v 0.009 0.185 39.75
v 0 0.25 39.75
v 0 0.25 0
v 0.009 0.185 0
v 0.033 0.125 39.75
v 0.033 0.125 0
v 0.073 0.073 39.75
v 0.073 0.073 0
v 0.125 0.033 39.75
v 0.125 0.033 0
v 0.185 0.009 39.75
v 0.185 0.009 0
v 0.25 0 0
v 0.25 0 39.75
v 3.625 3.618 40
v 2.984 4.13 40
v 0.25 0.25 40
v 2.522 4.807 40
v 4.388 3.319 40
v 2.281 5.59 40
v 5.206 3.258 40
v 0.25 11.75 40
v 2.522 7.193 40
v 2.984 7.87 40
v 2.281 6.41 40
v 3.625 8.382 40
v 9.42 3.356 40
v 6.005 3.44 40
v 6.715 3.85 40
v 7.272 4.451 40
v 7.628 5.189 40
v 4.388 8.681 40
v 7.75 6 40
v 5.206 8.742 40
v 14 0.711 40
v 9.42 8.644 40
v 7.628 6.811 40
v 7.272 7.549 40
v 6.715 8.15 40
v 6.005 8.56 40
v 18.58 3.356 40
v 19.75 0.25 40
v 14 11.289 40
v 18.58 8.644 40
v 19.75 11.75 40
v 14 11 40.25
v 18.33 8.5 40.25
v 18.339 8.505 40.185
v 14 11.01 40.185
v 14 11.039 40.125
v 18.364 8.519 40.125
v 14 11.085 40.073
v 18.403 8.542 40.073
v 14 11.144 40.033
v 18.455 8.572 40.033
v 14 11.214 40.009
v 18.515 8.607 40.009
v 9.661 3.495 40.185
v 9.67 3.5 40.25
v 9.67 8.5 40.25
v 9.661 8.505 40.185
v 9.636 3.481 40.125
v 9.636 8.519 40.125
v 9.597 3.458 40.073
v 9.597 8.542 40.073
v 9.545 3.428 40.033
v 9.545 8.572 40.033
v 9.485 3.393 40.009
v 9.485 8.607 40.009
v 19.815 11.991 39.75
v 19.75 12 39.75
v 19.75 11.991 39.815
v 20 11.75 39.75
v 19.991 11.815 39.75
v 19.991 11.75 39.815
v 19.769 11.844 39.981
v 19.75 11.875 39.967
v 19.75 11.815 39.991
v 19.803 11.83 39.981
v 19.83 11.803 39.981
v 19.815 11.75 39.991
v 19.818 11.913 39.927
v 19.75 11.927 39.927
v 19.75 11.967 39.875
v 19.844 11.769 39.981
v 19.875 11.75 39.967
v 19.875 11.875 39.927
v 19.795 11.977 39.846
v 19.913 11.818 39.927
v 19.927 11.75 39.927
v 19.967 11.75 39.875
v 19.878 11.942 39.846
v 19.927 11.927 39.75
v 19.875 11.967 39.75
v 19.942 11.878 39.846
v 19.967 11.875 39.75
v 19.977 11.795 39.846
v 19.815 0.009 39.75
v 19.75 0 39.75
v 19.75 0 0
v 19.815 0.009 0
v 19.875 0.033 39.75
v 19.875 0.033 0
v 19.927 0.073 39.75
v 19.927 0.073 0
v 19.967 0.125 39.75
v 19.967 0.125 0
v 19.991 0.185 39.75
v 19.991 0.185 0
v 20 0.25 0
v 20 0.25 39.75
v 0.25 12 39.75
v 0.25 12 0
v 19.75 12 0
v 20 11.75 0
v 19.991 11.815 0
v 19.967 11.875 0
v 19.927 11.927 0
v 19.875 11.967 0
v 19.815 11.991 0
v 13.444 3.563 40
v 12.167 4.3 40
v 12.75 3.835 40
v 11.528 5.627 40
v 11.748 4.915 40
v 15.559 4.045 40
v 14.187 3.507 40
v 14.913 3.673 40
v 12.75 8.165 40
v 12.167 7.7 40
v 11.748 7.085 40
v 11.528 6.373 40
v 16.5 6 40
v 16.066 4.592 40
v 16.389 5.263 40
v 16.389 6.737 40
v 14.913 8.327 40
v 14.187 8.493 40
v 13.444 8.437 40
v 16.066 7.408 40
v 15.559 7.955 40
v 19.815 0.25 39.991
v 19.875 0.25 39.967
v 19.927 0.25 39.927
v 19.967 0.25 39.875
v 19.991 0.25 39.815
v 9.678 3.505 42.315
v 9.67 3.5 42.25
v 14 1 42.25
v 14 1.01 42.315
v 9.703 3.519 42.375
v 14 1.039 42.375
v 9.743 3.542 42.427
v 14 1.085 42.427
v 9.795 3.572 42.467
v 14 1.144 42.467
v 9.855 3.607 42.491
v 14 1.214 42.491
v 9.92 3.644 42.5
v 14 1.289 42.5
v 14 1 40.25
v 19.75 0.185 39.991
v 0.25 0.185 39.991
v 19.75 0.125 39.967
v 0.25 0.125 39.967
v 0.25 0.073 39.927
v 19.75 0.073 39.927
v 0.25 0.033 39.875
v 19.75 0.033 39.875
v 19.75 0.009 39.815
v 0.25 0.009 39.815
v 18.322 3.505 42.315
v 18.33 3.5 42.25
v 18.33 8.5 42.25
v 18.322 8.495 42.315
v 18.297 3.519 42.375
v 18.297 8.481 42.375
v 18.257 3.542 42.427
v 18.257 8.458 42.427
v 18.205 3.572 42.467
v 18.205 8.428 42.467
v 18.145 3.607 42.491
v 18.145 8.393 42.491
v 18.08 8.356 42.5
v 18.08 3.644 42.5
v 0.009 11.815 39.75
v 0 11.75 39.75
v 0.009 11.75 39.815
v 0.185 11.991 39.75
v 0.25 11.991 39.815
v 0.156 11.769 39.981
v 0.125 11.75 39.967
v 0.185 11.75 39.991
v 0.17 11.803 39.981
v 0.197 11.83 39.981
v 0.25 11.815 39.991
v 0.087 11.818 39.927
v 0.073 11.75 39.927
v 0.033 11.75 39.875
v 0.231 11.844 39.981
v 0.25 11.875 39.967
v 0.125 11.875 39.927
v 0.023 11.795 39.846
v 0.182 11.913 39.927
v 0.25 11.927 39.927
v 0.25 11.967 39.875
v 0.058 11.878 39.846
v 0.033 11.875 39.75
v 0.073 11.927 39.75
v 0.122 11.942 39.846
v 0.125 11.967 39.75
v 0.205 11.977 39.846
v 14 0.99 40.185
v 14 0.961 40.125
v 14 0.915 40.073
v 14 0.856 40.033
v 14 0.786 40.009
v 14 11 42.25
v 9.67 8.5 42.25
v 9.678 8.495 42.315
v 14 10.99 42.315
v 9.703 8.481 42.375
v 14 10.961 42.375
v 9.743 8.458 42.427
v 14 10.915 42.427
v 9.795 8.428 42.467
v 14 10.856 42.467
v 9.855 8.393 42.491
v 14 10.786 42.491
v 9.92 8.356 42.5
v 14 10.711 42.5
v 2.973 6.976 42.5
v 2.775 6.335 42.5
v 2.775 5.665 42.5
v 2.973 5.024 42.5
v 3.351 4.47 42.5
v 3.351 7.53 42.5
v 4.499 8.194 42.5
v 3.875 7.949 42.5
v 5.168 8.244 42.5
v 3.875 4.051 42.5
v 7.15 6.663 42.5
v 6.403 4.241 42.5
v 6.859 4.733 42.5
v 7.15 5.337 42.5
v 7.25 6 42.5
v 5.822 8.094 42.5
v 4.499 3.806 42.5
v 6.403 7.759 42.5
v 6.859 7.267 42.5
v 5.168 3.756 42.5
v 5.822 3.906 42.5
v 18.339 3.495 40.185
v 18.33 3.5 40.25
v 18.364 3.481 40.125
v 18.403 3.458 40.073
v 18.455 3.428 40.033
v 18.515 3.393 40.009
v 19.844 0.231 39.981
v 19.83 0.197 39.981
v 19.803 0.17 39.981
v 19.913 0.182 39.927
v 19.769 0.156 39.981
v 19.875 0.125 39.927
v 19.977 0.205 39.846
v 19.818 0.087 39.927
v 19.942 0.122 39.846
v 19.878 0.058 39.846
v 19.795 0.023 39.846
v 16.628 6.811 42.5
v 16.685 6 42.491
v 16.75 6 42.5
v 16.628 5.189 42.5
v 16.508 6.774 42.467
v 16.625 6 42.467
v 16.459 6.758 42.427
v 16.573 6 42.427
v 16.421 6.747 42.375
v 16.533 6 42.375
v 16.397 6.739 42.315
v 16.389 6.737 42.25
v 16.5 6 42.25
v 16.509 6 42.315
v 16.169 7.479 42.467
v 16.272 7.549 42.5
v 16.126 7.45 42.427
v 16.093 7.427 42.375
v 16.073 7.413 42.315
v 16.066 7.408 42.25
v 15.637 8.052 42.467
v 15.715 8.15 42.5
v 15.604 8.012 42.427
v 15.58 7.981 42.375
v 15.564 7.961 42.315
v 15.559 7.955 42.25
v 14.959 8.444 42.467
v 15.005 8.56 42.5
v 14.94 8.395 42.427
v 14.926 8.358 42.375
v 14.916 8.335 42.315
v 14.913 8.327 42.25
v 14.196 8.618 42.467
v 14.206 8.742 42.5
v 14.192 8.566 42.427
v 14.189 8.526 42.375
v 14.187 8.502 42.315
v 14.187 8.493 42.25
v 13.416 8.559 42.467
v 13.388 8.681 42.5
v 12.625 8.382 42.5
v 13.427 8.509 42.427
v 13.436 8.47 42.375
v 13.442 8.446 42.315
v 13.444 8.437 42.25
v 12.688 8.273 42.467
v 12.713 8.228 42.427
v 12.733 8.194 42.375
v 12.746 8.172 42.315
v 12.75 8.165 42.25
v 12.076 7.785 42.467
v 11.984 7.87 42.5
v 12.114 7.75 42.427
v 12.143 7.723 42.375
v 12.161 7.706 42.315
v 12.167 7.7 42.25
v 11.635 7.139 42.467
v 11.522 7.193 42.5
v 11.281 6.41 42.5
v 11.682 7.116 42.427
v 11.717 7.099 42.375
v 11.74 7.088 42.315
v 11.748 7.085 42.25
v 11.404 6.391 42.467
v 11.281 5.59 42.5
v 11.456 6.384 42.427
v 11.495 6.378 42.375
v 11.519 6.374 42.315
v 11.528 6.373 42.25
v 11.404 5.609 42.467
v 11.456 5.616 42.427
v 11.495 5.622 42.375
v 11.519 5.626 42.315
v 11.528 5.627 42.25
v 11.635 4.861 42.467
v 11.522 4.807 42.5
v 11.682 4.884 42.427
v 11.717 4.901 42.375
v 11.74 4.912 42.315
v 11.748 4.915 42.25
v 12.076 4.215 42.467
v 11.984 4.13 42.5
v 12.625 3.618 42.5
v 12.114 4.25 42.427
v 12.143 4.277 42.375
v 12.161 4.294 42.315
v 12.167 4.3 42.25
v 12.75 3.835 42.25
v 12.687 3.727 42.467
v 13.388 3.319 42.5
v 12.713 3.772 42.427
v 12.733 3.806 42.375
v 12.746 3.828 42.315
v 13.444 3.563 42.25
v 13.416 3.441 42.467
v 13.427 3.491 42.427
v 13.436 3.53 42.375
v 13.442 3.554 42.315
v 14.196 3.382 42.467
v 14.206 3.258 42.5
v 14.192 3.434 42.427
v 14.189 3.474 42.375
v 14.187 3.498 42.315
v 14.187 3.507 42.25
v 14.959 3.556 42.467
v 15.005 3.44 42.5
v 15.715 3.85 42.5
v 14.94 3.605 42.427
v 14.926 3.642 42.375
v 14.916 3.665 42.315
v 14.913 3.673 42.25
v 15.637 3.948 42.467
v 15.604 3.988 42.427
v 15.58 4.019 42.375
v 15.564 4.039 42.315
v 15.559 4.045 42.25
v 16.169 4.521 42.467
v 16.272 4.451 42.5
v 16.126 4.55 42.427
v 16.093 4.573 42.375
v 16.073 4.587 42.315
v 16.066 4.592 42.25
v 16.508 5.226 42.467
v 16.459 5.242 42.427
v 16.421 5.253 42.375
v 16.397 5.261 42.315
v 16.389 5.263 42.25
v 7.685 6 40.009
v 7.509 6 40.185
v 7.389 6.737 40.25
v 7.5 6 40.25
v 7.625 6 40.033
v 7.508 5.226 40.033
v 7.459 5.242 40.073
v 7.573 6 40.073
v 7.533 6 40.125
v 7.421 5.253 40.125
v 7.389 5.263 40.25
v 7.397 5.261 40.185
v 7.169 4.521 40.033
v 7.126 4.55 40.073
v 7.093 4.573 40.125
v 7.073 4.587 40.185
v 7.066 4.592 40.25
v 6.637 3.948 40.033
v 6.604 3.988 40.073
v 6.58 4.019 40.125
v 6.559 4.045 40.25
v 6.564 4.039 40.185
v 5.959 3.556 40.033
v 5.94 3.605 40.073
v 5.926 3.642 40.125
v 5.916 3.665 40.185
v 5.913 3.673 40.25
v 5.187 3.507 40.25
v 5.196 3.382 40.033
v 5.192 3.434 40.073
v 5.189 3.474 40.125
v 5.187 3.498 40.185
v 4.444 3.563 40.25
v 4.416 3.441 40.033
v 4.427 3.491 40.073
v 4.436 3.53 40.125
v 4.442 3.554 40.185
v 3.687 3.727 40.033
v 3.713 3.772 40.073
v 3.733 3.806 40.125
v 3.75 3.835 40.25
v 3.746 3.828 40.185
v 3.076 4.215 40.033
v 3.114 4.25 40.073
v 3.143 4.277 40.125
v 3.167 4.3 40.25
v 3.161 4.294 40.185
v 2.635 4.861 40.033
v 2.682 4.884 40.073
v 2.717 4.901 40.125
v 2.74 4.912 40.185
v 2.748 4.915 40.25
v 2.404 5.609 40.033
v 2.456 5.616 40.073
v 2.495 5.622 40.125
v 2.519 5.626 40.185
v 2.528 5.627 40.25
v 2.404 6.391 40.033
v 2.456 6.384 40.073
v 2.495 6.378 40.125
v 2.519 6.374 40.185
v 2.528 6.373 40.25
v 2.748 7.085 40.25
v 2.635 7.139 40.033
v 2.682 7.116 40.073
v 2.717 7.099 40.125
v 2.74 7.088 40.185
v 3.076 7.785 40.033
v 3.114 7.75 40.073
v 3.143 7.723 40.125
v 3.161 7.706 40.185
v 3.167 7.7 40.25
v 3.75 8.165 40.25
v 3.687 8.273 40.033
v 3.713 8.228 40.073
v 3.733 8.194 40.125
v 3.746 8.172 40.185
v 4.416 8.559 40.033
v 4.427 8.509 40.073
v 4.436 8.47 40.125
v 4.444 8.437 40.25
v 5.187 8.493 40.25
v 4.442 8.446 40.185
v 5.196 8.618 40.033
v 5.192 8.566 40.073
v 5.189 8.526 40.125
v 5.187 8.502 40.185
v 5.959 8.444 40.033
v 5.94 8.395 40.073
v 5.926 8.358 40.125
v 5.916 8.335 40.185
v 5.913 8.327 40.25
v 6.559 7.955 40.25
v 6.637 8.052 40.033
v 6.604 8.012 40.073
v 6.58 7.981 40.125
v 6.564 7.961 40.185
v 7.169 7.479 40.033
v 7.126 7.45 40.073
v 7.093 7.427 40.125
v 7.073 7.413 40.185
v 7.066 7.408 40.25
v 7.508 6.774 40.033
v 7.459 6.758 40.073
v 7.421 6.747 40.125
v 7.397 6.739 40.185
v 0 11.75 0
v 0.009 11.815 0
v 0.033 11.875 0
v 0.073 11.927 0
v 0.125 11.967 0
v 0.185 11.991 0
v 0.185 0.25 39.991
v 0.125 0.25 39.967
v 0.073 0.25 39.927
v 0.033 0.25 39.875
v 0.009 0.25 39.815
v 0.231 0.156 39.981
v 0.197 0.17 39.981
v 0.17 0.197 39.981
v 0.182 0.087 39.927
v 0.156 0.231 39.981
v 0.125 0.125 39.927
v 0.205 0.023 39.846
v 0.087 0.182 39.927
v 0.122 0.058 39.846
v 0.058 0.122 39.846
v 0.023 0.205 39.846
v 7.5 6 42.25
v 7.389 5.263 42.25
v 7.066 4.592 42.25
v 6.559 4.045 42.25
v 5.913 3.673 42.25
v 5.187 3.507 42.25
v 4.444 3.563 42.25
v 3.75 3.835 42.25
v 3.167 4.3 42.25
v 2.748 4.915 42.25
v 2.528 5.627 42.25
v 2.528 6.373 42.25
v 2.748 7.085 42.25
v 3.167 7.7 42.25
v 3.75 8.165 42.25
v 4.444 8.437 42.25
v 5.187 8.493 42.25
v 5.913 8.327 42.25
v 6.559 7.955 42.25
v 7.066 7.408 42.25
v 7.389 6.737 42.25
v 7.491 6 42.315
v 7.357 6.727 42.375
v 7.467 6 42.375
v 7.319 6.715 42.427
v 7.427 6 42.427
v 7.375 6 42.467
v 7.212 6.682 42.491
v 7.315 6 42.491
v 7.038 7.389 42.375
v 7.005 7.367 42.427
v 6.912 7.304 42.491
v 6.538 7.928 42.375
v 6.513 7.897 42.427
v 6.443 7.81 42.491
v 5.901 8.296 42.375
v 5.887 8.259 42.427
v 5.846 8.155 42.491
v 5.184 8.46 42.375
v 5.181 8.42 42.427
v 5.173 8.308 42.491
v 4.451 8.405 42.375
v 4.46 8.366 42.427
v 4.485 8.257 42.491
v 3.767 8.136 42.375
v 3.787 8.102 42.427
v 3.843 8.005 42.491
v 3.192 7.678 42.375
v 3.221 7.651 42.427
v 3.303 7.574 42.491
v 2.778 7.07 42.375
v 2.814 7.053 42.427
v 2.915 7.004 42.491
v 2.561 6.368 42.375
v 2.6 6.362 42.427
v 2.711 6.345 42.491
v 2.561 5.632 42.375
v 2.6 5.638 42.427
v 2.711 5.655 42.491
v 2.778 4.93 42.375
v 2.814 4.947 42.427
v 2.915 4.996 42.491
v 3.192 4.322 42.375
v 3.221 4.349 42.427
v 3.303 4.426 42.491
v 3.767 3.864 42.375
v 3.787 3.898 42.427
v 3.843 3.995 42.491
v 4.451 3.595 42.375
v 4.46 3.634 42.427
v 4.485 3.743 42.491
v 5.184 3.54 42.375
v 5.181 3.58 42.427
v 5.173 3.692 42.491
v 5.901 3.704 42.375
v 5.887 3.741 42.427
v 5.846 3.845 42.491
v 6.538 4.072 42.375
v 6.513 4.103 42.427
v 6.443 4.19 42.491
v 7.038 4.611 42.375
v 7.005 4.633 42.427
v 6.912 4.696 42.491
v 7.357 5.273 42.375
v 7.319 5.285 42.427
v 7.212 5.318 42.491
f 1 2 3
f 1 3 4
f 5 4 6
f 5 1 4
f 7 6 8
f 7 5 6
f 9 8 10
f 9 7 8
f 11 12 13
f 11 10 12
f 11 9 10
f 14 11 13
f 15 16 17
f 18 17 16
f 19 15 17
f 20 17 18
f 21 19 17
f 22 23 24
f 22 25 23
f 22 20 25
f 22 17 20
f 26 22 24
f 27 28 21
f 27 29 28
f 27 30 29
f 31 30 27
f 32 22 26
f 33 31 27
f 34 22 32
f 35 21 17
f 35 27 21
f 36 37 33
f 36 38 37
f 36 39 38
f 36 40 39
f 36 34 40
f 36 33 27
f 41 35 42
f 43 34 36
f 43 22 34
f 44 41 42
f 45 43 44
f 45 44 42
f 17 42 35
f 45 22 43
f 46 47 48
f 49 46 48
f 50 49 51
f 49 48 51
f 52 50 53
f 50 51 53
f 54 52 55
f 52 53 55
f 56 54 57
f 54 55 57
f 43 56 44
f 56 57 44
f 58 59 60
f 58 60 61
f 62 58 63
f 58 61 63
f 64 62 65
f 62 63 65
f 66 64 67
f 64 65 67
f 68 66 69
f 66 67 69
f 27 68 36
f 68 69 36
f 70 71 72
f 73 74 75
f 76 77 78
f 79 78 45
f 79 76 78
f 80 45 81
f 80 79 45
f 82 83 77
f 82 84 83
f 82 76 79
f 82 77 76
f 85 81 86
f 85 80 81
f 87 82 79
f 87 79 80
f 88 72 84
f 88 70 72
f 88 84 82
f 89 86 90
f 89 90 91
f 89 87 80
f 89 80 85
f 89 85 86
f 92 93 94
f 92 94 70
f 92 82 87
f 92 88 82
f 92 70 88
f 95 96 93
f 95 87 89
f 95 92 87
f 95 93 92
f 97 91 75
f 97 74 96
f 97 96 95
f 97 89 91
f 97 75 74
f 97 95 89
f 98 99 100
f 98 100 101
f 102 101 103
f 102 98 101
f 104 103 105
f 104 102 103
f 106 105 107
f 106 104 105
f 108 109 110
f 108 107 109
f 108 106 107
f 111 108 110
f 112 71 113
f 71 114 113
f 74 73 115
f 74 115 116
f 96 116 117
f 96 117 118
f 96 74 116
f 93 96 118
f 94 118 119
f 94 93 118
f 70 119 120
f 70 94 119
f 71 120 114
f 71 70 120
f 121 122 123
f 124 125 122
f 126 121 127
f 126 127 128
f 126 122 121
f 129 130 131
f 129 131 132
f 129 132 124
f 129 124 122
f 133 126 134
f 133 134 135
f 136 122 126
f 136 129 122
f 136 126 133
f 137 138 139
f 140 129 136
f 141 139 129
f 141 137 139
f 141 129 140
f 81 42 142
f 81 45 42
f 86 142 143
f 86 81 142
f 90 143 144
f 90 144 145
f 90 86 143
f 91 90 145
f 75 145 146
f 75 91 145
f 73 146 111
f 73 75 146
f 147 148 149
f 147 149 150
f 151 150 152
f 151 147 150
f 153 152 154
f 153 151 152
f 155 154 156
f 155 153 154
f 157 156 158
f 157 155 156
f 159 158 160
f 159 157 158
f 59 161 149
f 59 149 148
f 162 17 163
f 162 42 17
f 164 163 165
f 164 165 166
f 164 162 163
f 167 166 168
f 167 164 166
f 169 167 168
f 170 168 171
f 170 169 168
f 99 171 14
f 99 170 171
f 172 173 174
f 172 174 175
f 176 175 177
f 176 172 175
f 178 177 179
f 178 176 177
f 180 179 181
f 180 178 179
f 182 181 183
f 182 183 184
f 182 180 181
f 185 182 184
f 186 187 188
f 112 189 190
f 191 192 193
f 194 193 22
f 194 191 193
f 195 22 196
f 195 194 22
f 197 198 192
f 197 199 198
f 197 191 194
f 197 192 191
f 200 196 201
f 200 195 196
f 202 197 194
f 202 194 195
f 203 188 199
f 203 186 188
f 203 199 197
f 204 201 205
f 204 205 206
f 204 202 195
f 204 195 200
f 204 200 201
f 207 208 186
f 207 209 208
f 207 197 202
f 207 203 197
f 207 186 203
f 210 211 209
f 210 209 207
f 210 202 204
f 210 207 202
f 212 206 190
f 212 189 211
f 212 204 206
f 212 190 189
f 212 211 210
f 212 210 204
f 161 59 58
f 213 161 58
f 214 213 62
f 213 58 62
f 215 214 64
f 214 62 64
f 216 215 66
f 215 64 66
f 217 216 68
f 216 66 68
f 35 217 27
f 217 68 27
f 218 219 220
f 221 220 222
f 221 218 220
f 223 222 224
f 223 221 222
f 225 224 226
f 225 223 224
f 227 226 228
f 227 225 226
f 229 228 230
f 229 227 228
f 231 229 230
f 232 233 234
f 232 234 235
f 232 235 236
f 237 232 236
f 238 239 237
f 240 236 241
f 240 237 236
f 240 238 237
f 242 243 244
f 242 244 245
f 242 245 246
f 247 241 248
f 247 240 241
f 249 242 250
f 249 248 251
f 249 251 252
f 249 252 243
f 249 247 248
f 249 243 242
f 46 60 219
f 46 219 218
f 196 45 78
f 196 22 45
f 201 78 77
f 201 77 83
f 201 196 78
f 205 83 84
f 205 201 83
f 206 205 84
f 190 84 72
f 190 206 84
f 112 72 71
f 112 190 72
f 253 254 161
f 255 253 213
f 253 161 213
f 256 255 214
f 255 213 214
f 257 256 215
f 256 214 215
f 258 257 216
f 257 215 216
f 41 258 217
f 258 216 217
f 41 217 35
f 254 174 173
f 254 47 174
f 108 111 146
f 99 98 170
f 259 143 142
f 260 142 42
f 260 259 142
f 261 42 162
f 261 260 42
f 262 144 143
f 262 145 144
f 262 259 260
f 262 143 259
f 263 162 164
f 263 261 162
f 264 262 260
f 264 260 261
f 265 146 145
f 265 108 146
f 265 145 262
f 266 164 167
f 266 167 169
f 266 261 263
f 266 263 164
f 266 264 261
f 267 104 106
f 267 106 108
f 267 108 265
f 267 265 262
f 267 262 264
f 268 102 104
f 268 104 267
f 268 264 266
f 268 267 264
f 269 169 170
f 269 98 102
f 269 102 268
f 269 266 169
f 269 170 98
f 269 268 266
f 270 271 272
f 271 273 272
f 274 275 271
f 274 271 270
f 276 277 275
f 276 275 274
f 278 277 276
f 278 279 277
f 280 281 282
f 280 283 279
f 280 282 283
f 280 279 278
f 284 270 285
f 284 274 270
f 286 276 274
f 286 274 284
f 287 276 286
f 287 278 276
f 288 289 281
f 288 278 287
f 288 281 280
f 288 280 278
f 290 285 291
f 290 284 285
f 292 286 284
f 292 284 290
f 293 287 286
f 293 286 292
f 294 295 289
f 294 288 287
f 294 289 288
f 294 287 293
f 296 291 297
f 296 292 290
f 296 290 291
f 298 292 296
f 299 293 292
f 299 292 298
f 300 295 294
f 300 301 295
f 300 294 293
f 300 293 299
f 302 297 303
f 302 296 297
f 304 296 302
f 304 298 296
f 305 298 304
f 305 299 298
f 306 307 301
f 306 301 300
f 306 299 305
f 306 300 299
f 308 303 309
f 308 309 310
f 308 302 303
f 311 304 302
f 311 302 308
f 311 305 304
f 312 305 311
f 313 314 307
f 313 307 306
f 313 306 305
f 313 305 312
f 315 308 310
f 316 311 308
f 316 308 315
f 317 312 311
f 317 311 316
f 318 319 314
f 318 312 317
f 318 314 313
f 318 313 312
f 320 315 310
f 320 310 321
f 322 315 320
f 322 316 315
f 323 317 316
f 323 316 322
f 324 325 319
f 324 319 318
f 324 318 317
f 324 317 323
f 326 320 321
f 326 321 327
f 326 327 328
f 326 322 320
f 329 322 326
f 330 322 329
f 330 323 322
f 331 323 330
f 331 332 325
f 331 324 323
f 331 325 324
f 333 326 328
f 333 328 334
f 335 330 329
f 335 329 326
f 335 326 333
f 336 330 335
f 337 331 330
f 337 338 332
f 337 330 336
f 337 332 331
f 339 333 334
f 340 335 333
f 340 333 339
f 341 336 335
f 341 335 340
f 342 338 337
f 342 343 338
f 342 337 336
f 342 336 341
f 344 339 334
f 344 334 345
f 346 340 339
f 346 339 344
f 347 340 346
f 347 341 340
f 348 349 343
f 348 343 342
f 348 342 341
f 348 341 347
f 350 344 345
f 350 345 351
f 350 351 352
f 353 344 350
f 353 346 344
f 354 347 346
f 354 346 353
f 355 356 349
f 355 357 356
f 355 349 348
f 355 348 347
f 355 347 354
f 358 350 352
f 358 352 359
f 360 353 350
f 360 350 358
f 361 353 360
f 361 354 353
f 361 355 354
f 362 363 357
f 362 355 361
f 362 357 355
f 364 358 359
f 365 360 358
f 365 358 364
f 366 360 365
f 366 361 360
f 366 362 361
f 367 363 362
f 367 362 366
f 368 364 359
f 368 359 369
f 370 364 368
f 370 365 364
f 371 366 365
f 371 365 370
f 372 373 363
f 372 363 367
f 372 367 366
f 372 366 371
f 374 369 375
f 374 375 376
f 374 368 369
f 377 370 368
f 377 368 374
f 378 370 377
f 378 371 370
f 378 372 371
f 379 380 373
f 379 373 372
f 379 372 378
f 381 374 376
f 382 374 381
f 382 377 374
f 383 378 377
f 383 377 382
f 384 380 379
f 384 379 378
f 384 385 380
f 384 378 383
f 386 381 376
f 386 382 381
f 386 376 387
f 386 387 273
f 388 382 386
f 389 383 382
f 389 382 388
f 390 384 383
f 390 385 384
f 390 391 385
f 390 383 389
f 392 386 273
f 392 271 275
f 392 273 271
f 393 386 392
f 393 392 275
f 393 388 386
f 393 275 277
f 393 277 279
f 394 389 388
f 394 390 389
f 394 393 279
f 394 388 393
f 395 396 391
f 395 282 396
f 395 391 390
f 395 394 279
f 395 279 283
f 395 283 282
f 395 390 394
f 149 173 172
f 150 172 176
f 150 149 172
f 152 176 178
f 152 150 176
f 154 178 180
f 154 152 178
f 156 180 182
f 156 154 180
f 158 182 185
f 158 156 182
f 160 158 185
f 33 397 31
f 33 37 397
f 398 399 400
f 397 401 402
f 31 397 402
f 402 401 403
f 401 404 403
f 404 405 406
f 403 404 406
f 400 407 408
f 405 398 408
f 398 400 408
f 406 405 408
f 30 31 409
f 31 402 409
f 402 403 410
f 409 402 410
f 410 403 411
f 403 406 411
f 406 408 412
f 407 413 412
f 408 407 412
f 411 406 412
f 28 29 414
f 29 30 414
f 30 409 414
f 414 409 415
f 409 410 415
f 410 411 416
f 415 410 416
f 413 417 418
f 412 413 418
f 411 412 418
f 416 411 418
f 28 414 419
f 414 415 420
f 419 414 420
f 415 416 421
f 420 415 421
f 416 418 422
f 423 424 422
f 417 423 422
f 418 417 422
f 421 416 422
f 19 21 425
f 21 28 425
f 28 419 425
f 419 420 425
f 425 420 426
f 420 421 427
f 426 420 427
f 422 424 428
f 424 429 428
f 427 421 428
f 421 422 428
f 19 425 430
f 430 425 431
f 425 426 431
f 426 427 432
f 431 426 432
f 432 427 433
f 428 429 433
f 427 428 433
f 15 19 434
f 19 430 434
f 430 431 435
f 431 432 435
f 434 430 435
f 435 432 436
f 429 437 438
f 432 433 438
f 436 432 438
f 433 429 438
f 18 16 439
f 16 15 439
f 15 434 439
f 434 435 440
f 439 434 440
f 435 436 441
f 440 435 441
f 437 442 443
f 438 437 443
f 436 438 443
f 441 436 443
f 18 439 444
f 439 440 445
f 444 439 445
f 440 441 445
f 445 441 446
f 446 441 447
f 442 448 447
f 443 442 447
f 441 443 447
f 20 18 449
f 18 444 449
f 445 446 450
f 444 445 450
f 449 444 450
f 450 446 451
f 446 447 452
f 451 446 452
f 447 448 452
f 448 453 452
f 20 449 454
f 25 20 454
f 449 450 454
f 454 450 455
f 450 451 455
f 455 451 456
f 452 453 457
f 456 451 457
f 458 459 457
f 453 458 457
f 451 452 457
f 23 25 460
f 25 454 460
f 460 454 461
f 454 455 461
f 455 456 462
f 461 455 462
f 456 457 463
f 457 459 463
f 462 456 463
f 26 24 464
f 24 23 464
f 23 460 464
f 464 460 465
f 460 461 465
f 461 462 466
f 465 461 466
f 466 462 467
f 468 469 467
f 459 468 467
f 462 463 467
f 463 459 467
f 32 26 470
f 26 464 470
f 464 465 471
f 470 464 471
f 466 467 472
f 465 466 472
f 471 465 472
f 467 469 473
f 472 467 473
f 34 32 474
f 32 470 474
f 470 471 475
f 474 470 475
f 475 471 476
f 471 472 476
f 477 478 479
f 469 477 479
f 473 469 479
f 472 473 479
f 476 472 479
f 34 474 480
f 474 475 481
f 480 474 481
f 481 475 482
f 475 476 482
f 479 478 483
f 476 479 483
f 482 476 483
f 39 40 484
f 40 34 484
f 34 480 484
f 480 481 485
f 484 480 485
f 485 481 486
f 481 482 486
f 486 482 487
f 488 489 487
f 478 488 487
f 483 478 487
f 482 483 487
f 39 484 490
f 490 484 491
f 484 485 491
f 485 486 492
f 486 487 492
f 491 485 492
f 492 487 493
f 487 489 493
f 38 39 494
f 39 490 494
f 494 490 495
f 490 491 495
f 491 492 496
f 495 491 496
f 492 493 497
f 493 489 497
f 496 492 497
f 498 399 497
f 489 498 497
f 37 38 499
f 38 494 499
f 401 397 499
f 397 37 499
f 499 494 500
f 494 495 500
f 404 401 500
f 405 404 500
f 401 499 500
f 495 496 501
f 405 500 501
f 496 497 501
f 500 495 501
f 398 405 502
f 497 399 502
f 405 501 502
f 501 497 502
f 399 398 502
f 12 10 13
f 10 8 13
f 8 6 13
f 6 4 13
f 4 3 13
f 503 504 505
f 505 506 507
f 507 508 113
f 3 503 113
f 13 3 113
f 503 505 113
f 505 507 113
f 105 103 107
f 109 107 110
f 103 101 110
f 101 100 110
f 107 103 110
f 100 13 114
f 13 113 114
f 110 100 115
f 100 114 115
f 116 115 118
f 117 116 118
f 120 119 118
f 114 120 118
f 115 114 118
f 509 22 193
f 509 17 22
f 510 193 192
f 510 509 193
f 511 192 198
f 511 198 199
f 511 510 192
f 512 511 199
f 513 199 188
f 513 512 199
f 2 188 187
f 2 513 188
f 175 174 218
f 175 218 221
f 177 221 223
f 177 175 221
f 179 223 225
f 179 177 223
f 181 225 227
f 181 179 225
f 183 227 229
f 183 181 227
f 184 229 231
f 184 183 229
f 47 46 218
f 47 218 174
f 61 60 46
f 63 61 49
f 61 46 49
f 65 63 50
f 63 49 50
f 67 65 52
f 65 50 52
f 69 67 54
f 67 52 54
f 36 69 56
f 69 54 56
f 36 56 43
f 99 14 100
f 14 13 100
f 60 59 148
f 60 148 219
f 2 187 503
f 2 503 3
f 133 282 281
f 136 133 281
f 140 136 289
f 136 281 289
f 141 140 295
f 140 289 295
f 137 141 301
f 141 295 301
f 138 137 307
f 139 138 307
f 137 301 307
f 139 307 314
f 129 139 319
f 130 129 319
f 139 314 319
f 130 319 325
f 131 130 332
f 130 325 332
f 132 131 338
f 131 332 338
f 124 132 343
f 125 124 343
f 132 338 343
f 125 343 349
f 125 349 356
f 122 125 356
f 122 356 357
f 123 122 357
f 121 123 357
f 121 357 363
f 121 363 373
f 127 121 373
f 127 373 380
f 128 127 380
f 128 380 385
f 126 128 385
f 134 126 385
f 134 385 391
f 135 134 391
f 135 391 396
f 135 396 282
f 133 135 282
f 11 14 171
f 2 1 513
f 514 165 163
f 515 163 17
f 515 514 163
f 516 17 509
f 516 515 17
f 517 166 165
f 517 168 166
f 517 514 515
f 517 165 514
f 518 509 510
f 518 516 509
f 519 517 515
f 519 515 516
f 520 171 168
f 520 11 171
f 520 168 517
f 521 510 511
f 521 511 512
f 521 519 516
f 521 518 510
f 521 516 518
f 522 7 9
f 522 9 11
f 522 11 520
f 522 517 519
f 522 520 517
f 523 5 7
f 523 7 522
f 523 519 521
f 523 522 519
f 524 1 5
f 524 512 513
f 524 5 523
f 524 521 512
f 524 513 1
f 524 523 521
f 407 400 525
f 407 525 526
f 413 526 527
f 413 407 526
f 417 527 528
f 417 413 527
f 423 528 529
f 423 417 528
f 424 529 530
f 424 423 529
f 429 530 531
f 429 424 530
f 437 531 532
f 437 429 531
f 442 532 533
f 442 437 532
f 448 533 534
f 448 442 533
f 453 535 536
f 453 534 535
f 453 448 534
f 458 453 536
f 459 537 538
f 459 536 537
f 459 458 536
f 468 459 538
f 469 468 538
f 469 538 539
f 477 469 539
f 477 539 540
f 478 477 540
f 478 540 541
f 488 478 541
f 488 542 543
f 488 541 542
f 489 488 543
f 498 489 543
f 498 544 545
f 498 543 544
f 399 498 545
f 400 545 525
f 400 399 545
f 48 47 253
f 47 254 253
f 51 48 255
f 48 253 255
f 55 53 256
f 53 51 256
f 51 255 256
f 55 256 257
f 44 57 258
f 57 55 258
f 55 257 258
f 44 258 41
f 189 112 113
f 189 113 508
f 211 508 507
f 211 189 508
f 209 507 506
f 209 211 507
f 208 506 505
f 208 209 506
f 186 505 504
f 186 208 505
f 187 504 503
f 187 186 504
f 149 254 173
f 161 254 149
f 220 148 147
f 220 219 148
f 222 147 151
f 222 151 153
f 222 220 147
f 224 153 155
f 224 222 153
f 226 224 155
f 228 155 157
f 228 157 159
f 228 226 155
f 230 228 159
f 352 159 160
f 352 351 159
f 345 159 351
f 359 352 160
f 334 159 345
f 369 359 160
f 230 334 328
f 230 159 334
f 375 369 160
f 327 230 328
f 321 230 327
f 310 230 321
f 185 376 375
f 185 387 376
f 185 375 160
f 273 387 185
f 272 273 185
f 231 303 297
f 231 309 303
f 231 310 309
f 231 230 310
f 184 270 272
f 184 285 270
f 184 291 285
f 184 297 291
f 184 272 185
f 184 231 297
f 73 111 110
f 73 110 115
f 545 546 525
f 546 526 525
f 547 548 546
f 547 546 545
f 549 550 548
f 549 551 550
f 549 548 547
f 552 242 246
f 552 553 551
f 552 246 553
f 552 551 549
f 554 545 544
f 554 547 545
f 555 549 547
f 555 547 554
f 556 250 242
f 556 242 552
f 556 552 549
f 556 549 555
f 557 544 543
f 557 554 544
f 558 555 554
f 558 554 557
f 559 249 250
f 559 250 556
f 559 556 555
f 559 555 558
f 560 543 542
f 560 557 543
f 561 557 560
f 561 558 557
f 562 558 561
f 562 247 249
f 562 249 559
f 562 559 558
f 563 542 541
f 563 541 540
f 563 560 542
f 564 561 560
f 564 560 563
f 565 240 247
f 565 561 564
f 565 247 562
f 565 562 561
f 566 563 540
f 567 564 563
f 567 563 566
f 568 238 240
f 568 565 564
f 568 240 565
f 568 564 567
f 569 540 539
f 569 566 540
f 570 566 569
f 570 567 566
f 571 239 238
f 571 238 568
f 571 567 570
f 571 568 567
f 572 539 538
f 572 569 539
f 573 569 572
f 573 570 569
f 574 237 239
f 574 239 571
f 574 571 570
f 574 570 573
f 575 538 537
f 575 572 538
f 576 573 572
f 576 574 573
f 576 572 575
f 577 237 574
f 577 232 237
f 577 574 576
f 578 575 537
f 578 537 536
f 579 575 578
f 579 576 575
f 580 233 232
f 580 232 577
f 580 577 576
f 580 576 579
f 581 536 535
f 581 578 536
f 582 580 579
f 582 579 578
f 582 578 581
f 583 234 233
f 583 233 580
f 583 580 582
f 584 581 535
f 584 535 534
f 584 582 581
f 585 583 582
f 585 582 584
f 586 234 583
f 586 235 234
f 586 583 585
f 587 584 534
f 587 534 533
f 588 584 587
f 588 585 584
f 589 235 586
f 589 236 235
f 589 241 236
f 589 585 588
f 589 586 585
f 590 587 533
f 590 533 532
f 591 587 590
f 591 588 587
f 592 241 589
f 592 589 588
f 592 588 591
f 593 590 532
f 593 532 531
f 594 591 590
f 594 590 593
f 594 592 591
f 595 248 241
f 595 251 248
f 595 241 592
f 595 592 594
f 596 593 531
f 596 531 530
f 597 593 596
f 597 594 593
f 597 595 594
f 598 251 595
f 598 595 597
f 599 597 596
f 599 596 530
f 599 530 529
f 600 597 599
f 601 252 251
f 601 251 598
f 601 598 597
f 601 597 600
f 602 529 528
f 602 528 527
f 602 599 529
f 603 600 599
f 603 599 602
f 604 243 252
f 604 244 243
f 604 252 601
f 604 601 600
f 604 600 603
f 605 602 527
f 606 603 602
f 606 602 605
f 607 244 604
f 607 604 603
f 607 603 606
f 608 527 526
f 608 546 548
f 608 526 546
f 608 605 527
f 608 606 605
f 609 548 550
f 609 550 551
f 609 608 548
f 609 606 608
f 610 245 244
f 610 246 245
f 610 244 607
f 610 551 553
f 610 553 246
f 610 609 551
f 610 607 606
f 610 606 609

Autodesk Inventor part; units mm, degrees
ref_plane "YZ Plane" through (0, 0, 0) normal (1, 0, 0) x (0, 1, 0)
ref_plane "XZ Plane" through (0, 0, 0) normal (0, 1, 0) x (-1, 0, 0)
ref_plane "XY Plane" through (0, 0, 0) normal (0, 0, 1) x (1, 0, 0)
sketch "Sketch1" plane through (0, 0, 0) normal (0, 0, 1) x (1, 0, 0)
  line L0 (20, 12) -> (0, 12)
  line L1 (0, 12) -> (0, 0)
  line L2 (0, 0) -> (20, 0)
  line L3 (20, 0) -> (20, 12)
extrude "Extrusion1" add sketch "Sketch1" along normal blind 40
sketch "Sketch2" plane through (0, 0, 40) normal (0, 0, 1) x (1, 0, 0)
  circle A0 centre (5, 6) radius 2.5
  line L0 (14, 1) -> (9.6699, 3.5)
  line L1 (9.6699, 3.5) -> (9.6699, 8.5)
  line L2 (9.6699, 8.5) -> (14, 11)
  line L3 (14, 11) -> (18.3301, 8.5)
  line L4 (18.3301, 8.5) -> (18.3301, 3.5)
  line L5 (18.3301, 3.5) -> (14, 1)
  point P0 (0, 0)
  point P1 (14, 6)
extrude "Extrusion2" add sketch "Sketch2" along normal blind 2.5
sketch "Sketch3" plane through (0, 0, 42.5) normal (0, 0, 1) x (1, 0, 0)
  circle A0 centre (14, 6) radius 2.5
  point P0 (0, 0)
  dimension "d15" = 5
extrude "Extrusion3" cut sketch "Sketch3" against normal blind 2.5
fillet "Fillet1" radius 0.25 1 edges at (2.5, 6, 42.5)
fillet "Fillet2" radius 0.25 13 edges at (11.8349, 2.25, 42.5) (16.1651, 2.25, 42.5) (18.3301, 6, 42.5) (9.6699, 6, 42.5) (11.8349, 9.75, 42.5) (16.1651, 9.75, 42.5) (11.5, 6, 42.5) (16.1651, 2.25, 40) (11.8349, 2.25, 40) (18.3301, 6, 40) (16.1651, 9.75, 40) (9.6699, 6, 40) (11.8349, 9.75, 40)
fillet "Fillet3" radius 0.25 1 edges at (2.5, 6, 40)
fillet "Fillet4" radius 0.25 8 edges at (20, 0, 20) (20, 12, 20) (0, 12, 20) (0, 0, 20) (0, 6, 40) (10, 0, 40) (20, 6, 40) (10, 12, 40)
properties part number "SPARC BOT Battery"
